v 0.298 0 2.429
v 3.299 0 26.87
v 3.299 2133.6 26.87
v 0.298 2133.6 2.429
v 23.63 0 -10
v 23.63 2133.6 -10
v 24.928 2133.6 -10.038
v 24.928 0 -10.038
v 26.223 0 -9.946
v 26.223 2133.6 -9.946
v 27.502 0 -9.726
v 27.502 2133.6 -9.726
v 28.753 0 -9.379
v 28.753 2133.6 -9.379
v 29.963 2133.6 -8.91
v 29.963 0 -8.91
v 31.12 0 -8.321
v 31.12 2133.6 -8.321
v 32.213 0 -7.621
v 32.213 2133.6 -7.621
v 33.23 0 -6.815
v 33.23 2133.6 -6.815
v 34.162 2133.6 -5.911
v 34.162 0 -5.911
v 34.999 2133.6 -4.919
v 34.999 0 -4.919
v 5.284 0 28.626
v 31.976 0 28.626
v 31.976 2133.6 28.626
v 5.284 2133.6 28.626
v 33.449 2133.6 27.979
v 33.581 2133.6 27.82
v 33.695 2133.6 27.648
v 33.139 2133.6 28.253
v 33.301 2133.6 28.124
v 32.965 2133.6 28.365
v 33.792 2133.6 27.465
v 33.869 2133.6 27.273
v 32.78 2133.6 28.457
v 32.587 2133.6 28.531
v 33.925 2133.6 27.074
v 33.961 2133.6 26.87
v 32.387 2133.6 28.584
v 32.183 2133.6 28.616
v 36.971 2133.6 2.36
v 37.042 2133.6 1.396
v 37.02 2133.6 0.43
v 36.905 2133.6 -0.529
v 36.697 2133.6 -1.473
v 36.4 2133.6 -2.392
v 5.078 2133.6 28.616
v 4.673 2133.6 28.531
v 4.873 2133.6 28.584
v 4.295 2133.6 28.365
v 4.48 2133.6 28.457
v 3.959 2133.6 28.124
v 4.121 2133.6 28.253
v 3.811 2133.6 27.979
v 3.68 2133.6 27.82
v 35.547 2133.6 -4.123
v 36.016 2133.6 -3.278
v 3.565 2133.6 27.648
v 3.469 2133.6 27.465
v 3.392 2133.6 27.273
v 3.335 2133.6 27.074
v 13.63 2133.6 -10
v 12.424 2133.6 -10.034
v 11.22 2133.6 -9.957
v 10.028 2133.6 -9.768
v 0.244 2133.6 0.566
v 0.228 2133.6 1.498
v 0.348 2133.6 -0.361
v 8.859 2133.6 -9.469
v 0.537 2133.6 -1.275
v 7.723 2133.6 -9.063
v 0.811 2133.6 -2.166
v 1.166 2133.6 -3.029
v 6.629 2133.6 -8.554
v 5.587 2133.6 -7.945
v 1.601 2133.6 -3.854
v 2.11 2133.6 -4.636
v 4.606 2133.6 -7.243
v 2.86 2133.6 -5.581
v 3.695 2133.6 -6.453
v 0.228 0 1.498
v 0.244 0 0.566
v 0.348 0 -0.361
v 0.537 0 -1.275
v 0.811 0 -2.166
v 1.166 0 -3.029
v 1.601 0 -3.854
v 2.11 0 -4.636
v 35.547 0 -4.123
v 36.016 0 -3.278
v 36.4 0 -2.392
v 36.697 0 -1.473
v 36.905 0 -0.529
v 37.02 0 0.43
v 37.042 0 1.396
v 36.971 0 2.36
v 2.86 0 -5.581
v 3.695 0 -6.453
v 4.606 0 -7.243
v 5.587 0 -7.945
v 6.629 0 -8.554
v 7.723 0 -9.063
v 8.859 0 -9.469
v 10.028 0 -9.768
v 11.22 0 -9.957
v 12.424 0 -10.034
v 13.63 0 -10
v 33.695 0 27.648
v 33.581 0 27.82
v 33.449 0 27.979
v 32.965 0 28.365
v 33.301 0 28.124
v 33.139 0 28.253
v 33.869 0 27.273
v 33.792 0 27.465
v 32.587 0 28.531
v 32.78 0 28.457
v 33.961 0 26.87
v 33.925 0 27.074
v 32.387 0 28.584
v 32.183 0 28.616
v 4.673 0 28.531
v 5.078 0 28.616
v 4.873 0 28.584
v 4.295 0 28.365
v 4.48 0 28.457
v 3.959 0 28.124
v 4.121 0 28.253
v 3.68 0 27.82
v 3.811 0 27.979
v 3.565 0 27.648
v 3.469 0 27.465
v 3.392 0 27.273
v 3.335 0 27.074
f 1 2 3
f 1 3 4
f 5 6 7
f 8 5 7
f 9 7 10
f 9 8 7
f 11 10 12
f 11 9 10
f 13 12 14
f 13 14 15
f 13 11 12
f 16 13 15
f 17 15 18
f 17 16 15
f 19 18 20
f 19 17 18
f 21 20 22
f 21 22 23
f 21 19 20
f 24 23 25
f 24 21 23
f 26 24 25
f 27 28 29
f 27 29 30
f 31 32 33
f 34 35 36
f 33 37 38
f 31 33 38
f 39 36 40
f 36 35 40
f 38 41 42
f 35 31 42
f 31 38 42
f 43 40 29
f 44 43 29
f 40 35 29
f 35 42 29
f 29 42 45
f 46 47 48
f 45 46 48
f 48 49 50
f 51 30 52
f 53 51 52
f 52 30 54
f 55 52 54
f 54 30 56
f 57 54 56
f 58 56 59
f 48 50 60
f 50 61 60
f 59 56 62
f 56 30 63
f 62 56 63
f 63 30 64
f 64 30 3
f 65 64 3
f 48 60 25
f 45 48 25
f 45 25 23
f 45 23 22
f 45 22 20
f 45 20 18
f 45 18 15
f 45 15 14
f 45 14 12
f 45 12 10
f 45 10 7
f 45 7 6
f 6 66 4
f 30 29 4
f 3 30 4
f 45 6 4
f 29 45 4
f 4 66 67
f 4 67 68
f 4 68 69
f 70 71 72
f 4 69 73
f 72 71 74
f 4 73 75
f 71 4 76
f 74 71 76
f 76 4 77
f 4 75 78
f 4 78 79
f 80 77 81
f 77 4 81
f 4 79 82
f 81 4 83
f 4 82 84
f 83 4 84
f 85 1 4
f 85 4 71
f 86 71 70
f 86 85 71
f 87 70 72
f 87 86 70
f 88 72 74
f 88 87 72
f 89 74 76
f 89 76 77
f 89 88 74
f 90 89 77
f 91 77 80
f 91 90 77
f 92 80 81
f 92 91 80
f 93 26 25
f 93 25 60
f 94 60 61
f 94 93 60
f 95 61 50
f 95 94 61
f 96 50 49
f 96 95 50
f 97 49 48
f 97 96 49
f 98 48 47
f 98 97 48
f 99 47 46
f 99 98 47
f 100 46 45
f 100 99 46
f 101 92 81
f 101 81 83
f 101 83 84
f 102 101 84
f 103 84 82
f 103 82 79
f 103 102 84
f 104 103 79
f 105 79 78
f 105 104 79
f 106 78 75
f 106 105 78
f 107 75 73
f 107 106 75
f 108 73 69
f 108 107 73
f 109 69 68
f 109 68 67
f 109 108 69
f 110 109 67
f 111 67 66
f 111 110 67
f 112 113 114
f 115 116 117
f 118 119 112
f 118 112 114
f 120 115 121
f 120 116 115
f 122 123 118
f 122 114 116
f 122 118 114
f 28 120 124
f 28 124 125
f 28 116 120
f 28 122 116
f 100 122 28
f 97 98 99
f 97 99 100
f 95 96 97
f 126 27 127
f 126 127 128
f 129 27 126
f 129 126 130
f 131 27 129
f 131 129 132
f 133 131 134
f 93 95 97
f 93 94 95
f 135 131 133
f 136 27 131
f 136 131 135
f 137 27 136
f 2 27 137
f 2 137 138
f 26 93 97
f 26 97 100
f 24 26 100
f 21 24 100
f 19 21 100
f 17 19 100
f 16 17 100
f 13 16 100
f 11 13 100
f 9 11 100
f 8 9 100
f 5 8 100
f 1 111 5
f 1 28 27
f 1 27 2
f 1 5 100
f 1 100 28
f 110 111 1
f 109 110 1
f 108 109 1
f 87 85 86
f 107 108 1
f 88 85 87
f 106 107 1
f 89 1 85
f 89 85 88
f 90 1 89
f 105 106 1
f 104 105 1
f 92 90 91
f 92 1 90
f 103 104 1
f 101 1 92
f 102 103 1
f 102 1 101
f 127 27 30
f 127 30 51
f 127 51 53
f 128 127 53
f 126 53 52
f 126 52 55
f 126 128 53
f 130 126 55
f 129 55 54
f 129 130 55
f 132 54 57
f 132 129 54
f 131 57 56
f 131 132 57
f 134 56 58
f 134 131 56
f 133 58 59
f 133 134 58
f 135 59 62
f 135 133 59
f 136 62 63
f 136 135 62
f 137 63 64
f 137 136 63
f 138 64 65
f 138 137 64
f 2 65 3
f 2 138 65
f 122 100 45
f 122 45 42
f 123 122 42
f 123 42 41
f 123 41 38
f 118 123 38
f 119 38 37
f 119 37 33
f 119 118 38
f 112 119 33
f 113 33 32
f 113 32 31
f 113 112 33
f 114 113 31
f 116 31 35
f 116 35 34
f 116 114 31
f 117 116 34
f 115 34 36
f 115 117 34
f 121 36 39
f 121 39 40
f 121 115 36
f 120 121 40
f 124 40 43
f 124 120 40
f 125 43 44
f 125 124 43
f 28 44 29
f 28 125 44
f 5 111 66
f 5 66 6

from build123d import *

# Parameters (mm, degrees)
BOSS_EXTRUDE1_DEPTH = 2133.6


with BuildPart() as part:
    # Sketch1 → Boss-Extrude1 (new body)
    with BuildSketch(Plane(origin=(0, 0, 0), x_dir=(1, 0, 0), z_dir=(0, 1, 0))):
        with BuildLine():
            Line((13.630161568, 10), (23.630161568, 10))
            ThreePointArc((23.630161568, 10), (29.962715696, 8.909575546), (34.999417241, 4.919349386))
            ThreePointArc((34.999417241, 4.919349386), (36.697471107, 1.472711464), (36.970576624, -2.359795976))
            Line((36.970576624, -2.359795976), (33.961097926, -26.870033055))
            ThreePointArc((33.961097926, -26.870033055), (33.301245719, -28.12420581), (31.976005623, -28.626294369))
            Line((31.976005623, -28.626294369), (5.284317513, -28.626294369))
            ThreePointArc((5.284317513, -28.626294369), (3.959077417, -28.12420581), (3.29922521, -26.870033055))
            Line((3.29922521, -26.870033055), (0.298191514, -2.428574989))
            ThreePointArc((0.298191514, -2.428574989), (0.53721959, 1.274672171), (2.110183266, 4.635767116))
            ThreePointArc((2.110183266, 4.635767116), (7.170061398, 8.821409583), (13.630161568, 10))
        make_face()
    extrude(amount=BOSS_EXTRUDE1_DEPTH)


solid = part.part
